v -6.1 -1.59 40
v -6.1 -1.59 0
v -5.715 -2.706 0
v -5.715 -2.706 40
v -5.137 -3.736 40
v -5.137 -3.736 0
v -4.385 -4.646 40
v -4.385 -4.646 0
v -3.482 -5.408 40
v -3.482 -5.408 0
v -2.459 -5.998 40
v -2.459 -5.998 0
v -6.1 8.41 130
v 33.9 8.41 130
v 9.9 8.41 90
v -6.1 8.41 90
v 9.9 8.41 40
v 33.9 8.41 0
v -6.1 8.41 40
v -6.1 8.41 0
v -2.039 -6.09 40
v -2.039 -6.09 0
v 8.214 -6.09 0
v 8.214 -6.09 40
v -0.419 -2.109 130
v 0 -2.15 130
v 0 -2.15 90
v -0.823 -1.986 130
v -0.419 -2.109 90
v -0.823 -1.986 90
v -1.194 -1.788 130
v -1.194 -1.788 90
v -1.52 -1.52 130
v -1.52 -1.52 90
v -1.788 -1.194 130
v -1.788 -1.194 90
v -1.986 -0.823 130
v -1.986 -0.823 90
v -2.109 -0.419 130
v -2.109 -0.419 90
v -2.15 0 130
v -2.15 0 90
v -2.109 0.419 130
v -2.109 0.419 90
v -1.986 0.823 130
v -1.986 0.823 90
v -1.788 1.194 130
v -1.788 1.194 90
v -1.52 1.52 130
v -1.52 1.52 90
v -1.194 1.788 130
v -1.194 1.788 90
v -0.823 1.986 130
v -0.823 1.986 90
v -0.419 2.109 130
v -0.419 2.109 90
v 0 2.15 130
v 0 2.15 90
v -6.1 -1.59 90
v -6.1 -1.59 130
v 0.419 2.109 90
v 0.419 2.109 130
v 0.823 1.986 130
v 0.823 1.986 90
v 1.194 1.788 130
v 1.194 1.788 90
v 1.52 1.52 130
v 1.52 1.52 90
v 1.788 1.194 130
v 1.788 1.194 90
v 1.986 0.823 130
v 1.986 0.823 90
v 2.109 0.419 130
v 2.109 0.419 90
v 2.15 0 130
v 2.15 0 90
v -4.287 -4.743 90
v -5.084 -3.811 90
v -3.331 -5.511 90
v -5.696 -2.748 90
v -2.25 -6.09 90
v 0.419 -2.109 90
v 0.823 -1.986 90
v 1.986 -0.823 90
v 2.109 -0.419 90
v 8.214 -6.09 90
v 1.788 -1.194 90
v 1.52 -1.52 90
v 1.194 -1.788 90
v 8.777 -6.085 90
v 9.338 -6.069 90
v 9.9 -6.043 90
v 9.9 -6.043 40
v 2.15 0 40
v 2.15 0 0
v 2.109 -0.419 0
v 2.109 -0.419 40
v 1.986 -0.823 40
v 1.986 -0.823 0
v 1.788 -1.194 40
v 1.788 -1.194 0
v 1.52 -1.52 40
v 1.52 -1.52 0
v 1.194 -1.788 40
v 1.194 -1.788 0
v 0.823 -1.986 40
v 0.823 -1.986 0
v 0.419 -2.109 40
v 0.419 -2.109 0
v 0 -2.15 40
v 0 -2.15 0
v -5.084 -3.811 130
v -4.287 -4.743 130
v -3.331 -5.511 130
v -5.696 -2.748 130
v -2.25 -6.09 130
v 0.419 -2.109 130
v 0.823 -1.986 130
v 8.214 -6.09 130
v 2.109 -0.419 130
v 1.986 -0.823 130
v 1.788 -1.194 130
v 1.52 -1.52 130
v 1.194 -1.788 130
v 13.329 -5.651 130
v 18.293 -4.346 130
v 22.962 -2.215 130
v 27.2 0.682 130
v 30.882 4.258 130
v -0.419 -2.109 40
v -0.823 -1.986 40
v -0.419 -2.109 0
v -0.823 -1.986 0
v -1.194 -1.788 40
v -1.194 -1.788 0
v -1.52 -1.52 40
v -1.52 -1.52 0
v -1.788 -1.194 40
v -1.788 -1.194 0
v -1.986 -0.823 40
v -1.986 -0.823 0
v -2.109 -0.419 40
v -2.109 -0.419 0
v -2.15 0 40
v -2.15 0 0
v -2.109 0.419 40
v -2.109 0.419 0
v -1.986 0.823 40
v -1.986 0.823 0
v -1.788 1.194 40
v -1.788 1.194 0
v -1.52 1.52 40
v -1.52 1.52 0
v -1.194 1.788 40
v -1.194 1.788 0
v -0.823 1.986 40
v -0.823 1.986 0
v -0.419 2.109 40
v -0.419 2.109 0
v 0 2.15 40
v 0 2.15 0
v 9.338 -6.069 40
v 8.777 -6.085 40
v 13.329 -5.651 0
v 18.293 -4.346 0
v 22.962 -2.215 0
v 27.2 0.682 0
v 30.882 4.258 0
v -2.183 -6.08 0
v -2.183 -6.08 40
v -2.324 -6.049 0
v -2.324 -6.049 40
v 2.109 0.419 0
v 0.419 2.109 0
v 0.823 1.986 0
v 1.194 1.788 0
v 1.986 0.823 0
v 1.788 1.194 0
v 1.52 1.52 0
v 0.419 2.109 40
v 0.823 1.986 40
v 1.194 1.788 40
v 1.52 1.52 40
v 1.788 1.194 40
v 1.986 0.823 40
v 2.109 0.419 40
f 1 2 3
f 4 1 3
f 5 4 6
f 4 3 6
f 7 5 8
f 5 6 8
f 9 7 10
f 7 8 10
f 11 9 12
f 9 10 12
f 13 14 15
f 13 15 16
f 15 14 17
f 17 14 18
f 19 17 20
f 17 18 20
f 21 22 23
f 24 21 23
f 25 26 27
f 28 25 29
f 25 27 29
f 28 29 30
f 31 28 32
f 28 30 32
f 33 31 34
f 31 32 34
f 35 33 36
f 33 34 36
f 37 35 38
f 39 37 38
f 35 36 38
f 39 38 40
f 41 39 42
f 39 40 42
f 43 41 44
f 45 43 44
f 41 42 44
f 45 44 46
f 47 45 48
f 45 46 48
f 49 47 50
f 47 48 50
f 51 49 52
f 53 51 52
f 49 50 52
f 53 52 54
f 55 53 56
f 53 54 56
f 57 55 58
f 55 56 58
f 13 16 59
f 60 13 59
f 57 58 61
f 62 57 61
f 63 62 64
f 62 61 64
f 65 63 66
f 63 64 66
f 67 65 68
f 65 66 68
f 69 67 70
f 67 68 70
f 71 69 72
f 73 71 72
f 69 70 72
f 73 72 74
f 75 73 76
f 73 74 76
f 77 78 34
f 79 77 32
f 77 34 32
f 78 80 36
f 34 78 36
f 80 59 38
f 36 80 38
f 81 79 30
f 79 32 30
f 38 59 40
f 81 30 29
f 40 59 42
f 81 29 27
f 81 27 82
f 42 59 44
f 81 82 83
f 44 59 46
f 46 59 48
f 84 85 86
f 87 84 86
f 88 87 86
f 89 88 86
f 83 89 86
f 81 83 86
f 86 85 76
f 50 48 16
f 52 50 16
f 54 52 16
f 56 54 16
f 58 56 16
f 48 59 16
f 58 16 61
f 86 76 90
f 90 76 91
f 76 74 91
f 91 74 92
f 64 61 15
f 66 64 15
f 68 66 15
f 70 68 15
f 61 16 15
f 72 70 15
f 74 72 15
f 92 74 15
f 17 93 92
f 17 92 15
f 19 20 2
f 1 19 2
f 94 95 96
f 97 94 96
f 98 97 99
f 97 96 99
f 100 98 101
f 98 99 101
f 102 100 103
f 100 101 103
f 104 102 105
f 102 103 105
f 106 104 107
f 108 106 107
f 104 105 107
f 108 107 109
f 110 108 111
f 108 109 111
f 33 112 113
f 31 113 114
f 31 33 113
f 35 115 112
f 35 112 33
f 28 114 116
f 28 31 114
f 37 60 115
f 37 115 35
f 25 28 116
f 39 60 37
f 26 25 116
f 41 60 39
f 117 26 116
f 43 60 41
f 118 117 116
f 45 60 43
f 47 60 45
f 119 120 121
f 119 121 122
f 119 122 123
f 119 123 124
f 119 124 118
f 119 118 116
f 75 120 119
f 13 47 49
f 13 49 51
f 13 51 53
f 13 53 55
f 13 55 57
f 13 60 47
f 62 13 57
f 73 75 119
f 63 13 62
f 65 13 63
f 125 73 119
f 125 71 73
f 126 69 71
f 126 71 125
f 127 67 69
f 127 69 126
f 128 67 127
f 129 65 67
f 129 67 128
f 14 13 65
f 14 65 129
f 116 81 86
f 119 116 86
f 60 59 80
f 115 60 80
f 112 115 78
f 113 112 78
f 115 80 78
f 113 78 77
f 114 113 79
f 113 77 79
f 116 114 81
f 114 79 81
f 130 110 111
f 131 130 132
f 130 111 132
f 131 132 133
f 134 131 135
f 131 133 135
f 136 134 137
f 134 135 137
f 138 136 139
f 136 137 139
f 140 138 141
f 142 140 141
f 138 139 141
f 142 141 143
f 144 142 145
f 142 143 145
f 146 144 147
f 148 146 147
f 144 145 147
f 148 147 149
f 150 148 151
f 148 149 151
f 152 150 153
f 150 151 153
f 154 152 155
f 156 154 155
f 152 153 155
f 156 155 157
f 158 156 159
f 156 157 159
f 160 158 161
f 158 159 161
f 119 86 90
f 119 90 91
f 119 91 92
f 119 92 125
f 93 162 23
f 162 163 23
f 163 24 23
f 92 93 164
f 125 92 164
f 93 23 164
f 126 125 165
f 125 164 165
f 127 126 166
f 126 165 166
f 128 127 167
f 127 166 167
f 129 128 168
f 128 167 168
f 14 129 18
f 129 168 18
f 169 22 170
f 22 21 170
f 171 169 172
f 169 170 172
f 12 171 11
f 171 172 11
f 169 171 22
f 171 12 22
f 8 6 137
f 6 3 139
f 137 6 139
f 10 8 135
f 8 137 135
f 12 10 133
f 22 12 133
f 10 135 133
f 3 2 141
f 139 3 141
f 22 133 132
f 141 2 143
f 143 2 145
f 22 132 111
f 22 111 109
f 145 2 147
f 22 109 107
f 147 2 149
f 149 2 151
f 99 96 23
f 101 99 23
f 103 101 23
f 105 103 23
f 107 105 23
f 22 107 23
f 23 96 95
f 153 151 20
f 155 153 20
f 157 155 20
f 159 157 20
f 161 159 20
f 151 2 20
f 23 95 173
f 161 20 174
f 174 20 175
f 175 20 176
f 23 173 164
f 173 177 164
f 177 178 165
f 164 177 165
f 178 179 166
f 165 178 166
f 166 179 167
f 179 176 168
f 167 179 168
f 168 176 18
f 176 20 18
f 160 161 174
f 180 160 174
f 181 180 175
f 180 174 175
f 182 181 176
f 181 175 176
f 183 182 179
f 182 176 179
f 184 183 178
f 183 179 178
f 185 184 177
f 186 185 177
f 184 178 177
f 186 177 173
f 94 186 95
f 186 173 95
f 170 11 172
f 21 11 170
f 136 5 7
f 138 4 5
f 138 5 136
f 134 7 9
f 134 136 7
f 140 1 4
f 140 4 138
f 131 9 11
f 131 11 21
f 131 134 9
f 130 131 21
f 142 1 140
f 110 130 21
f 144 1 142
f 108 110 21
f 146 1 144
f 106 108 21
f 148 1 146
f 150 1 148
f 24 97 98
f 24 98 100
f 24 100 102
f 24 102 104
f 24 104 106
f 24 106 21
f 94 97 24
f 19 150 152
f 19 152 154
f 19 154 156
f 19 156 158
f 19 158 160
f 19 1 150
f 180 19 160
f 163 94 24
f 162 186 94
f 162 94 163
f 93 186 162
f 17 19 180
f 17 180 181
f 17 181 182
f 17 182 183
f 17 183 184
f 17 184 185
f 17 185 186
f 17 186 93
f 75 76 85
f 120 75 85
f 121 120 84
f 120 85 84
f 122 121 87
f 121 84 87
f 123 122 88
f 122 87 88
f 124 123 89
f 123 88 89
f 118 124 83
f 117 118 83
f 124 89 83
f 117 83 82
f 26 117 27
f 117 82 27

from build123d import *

# Parameters (mm, degrees)
F0_W        = 24
F0_H        = 14.5
F1_DEPTH    = 130
F2_DEPTH    = 130
F3_DEPTH    = 90
F4_DEPTH    = 40
F5_R        = 1
F6_T1_DEPTH = 258.4279953904


# Not quite as in the source:
# - a fillet or chamfer that OpenCascade refuses, or shapes differently, is made with other operations: its cross-section is extruded or revolved along the edge and cut away or added


with BuildPart() as f1:
    # F0 (on Top) → F1 (new body)
    with BuildSketch(Plane.XY):
        with Locations((21.9, 1.16)):
            Rectangle(F0_W, F0_H)
    extrude(amount=F1_DEPTH)

    # F0 (on Top) → F2 (join)
    with BuildSketch(Plane.XY):
        with BuildLine():
            Line((9.9, 8.41), (6.1, 8.41))
            Line((6.1, 8.41), (6.1, -1.59))
            ThreePointArc((6.1, -1.59), (4.7073896383, -4.2954889128), (2.25, -6.09))
            Line((2.25, -6.09), (9.9, -6.09))
            Line((9.9, -6.09), (9.9, 8.41))
        make_face()
        with BuildLine():
            Line((6.1, -1.59), (6.1, 8.41))
            Line((6.1, 8.41), (0, 8.41))
            Line((0, 8.41), (0, 2.15))
            ThreePointArc((0, 2.15), (1.5202795796, 1.5202795796), (2.15, 0))
            ThreePointArc((2.15, 0), (1.5202795796, -1.5202795796), (0, -2.15))
            Line((0, -2.15), (0, -6.09))
            Line((0, -6.09), (2.25, -6.09))
            ThreePointArc((2.25, -6.09), (4.7073896383, -4.2954889128), (6.1, -1.59))
        make_face()
        with BuildLine():
            Line((0, 2.15), (0, 8.41))
            Line((0, 8.41), (-6.1, 8.41))
            Line((-6.1, 8.41), (-6.1, -1.59))
            ThreePointArc((-6.1, -1.59), (-4.7073896383, -4.2954889128), (-2.25, -6.09))
            Line((-2.25, -6.09), (0, -6.09))
            Line((0, -6.09), (0, -2.15))
            ThreePointArc((0, -2.15), (-2.15, 0), (0, 2.15))
        make_face()
    extrude(amount=F2_DEPTH)

    # F0 (on Top) → F3 (cut)
    with BuildSketch(Plane.XY):
        with BuildLine():
            Line((9.9, 8.41), (6.1, 8.41))
            Line((6.1, 8.41), (6.1, -1.59))
            ThreePointArc((6.1, -1.59), (4.7073896383, -4.2954889128), (2.25, -6.09))
            Line((2.25, -6.09), (9.9, -6.09))
            Line((9.9, -6.09), (9.9, 8.41))
        make_face()
        with BuildLine():
            Line((6.1, -1.59), (6.1, 8.41))
            Line((6.1, 8.41), (0, 8.41))
            Line((0, 8.41), (0, 2.15))
            ThreePointArc((0, 2.15), (1.5202795796, 1.5202795796), (2.15, 0))
            ThreePointArc((2.15, 0), (1.5202795796, -1.5202795796), (0, -2.15))
            Line((0, -2.15), (0, -6.09))
            Line((0, -6.09), (2.25, -6.09))
            ThreePointArc((2.25, -6.09), (4.7073896383, -4.2954889128), (6.1, -1.59))
        make_face()
        with BuildLine():
            Line((0, 2.15), (0, 8.41))
            Line((0, 8.41), (-6.1, 8.41))
            Line((-6.1, 8.41), (-6.1, -1.59))
            ThreePointArc((-6.1, -1.59), (-4.7073896383, -4.2954889128), (-2.25, -6.09))
            Line((-2.25, -6.09), (0, -6.09))
            Line((0, -6.09), (0, -2.15))
            ThreePointArc((0, -2.15), (-2.15, 0), (0, 2.15))
        make_face()
    extrude(amount=F3_DEPTH, mode=Mode.SUBTRACT)

    # F0 (on Top) → F4 (join)
    with BuildSketch(Plane.XY):
        with BuildLine():
            Line((0, 2.15), (0, 8.41))
            Line((0, 8.41), (-6.1, 8.41))
            Line((-6.1, 8.41), (-6.1, -1.59))
            ThreePointArc((-6.1, -1.59), (-4.7073896383, -4.2954889128), (-2.25, -6.09))
            Line((-2.25, -6.09), (0, -6.09))
            Line((0, -6.09), (0, -2.15))
            ThreePointArc((0, -2.15), (-2.15, 0), (0, 2.15))
        make_face()
        with BuildLine():
            Line((6.1, -1.59), (6.1, 8.41))
            Line((6.1, 8.41), (0, 8.41))
            Line((0, 8.41), (0, 2.15))
            ThreePointArc((0, 2.15), (1.5202795796, 1.5202795796), (2.15, 0))
            ThreePointArc((2.15, 0), (1.5202795796, -1.5202795796), (0, -2.15))
            Line((0, -2.15), (0, -6.09))
            Line((0, -6.09), (2.25, -6.09))
            ThreePointArc((2.25, -6.09), (4.7073896383, -4.2954889128), (6.1, -1.59))
        make_face()
        with BuildLine():
            Line((9.9, 8.41), (6.1, 8.41))
            Line((6.1, 8.41), (6.1, -1.59))
            ThreePointArc((6.1, -1.59), (4.7073896383, -4.2954889128), (2.25, -6.09))
            Line((2.25, -6.09), (9.9, -6.09))
            Line((9.9, -6.09), (9.9, 8.41))
        make_face()
    extrude(amount=F4_DEPTH)

    # F5
    f5_edges = [f1.edges().sort_by_distance(p)[0] for p in [
        (-2.25, -6.09, 20),
    ]]
    fillet(f5_edges, radius=F5_R)

    # F6: fillet of radius 30 on 1 edges, made by hand

    # F6_s2 → F6_t1 (cut)
    with BuildSketch(Plane.XY.offset(-64.2139976952)):
        with BuildLine():
            ThreePointArc((8.2144009219, -6.09), (22.9622821257, -2.2147009552), (33.9, 8.41))
            Line((33.9, 8.41), (33.9, -6.09))
            Line((33.9, -6.09), (8.2144009219, -6.09))
        make_face()
    extrude(amount=F6_T1_DEPTH, mode=Mode.SUBTRACT)


solid = f1.part
